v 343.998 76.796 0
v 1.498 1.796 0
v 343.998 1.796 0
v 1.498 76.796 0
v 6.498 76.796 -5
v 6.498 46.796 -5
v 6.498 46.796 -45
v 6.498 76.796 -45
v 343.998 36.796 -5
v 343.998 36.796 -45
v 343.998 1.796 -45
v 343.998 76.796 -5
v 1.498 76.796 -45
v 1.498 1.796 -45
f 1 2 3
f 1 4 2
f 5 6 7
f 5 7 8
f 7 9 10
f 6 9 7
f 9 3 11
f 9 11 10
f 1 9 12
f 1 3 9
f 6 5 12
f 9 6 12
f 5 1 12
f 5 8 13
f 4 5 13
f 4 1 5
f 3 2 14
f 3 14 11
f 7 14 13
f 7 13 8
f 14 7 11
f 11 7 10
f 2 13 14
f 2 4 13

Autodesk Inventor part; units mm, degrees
ref_plane "YZ Plane" through (0, 0, 0) normal (1, 0, 0) x (0, 1, 0)
ref_plane "XZ Plane" through (0, 0, 0) normal (0, 1, 0) x (-1, 0, 0)
ref_plane "XY Plane" through (0, 0, 0) normal (0, 0, 1) x (1, 0, 0)
sketch "Sketch1" plane through (0, 0, 0) normal (0, 0, 1) x (1, 0, 0)
  line L0 (6.4984, 1.7965) -> (6.4984, 46.7965)
  line L1 (6.4984, 1.7965) -> (343.9984, 1.7965)
  line L2 (343.9984, 1.7965) -> (343.9984, 36.7965)
  line L3 (343.9984, 36.7965) -> (6.4984, 46.7965)
  line L4 (6.4984, 46.7965) -> (6.4984, 76.7965)
  line L5 (6.4984, 76.7965) -> (343.9984, 76.7965)
  line L6 (343.9984, 76.7965) -> (343.9984, 36.7965)
  line L7 (6.4984, 76.7965) -> (1.4984, 76.7965)
  line L8 (1.4984, 76.7965) -> (1.4984, 1.7965)
  line L9 (1.4984, 1.7965) -> (6.4984, 1.7965)
  point P0 (0, 0)
  dimension "d0" = 45
  dimension "d1" = 35
  dimension "d2" = 337.5
  dimension "d3" = 30
  dimension "d12" = 5
extrude "Extrusion1" add sketch "Sketch1" against normal blind 45 contours L0 L3 L2 L1
extrude "Extrusion3" add sketch "Sketch1" against normal blind 5 contours L4 L5 L6 L3
extrude "Extrusion5" add sketch "Sketch1" against normal blind 45 contours L9 L8 L7 L4 L0
properties part number "collectingslide"
